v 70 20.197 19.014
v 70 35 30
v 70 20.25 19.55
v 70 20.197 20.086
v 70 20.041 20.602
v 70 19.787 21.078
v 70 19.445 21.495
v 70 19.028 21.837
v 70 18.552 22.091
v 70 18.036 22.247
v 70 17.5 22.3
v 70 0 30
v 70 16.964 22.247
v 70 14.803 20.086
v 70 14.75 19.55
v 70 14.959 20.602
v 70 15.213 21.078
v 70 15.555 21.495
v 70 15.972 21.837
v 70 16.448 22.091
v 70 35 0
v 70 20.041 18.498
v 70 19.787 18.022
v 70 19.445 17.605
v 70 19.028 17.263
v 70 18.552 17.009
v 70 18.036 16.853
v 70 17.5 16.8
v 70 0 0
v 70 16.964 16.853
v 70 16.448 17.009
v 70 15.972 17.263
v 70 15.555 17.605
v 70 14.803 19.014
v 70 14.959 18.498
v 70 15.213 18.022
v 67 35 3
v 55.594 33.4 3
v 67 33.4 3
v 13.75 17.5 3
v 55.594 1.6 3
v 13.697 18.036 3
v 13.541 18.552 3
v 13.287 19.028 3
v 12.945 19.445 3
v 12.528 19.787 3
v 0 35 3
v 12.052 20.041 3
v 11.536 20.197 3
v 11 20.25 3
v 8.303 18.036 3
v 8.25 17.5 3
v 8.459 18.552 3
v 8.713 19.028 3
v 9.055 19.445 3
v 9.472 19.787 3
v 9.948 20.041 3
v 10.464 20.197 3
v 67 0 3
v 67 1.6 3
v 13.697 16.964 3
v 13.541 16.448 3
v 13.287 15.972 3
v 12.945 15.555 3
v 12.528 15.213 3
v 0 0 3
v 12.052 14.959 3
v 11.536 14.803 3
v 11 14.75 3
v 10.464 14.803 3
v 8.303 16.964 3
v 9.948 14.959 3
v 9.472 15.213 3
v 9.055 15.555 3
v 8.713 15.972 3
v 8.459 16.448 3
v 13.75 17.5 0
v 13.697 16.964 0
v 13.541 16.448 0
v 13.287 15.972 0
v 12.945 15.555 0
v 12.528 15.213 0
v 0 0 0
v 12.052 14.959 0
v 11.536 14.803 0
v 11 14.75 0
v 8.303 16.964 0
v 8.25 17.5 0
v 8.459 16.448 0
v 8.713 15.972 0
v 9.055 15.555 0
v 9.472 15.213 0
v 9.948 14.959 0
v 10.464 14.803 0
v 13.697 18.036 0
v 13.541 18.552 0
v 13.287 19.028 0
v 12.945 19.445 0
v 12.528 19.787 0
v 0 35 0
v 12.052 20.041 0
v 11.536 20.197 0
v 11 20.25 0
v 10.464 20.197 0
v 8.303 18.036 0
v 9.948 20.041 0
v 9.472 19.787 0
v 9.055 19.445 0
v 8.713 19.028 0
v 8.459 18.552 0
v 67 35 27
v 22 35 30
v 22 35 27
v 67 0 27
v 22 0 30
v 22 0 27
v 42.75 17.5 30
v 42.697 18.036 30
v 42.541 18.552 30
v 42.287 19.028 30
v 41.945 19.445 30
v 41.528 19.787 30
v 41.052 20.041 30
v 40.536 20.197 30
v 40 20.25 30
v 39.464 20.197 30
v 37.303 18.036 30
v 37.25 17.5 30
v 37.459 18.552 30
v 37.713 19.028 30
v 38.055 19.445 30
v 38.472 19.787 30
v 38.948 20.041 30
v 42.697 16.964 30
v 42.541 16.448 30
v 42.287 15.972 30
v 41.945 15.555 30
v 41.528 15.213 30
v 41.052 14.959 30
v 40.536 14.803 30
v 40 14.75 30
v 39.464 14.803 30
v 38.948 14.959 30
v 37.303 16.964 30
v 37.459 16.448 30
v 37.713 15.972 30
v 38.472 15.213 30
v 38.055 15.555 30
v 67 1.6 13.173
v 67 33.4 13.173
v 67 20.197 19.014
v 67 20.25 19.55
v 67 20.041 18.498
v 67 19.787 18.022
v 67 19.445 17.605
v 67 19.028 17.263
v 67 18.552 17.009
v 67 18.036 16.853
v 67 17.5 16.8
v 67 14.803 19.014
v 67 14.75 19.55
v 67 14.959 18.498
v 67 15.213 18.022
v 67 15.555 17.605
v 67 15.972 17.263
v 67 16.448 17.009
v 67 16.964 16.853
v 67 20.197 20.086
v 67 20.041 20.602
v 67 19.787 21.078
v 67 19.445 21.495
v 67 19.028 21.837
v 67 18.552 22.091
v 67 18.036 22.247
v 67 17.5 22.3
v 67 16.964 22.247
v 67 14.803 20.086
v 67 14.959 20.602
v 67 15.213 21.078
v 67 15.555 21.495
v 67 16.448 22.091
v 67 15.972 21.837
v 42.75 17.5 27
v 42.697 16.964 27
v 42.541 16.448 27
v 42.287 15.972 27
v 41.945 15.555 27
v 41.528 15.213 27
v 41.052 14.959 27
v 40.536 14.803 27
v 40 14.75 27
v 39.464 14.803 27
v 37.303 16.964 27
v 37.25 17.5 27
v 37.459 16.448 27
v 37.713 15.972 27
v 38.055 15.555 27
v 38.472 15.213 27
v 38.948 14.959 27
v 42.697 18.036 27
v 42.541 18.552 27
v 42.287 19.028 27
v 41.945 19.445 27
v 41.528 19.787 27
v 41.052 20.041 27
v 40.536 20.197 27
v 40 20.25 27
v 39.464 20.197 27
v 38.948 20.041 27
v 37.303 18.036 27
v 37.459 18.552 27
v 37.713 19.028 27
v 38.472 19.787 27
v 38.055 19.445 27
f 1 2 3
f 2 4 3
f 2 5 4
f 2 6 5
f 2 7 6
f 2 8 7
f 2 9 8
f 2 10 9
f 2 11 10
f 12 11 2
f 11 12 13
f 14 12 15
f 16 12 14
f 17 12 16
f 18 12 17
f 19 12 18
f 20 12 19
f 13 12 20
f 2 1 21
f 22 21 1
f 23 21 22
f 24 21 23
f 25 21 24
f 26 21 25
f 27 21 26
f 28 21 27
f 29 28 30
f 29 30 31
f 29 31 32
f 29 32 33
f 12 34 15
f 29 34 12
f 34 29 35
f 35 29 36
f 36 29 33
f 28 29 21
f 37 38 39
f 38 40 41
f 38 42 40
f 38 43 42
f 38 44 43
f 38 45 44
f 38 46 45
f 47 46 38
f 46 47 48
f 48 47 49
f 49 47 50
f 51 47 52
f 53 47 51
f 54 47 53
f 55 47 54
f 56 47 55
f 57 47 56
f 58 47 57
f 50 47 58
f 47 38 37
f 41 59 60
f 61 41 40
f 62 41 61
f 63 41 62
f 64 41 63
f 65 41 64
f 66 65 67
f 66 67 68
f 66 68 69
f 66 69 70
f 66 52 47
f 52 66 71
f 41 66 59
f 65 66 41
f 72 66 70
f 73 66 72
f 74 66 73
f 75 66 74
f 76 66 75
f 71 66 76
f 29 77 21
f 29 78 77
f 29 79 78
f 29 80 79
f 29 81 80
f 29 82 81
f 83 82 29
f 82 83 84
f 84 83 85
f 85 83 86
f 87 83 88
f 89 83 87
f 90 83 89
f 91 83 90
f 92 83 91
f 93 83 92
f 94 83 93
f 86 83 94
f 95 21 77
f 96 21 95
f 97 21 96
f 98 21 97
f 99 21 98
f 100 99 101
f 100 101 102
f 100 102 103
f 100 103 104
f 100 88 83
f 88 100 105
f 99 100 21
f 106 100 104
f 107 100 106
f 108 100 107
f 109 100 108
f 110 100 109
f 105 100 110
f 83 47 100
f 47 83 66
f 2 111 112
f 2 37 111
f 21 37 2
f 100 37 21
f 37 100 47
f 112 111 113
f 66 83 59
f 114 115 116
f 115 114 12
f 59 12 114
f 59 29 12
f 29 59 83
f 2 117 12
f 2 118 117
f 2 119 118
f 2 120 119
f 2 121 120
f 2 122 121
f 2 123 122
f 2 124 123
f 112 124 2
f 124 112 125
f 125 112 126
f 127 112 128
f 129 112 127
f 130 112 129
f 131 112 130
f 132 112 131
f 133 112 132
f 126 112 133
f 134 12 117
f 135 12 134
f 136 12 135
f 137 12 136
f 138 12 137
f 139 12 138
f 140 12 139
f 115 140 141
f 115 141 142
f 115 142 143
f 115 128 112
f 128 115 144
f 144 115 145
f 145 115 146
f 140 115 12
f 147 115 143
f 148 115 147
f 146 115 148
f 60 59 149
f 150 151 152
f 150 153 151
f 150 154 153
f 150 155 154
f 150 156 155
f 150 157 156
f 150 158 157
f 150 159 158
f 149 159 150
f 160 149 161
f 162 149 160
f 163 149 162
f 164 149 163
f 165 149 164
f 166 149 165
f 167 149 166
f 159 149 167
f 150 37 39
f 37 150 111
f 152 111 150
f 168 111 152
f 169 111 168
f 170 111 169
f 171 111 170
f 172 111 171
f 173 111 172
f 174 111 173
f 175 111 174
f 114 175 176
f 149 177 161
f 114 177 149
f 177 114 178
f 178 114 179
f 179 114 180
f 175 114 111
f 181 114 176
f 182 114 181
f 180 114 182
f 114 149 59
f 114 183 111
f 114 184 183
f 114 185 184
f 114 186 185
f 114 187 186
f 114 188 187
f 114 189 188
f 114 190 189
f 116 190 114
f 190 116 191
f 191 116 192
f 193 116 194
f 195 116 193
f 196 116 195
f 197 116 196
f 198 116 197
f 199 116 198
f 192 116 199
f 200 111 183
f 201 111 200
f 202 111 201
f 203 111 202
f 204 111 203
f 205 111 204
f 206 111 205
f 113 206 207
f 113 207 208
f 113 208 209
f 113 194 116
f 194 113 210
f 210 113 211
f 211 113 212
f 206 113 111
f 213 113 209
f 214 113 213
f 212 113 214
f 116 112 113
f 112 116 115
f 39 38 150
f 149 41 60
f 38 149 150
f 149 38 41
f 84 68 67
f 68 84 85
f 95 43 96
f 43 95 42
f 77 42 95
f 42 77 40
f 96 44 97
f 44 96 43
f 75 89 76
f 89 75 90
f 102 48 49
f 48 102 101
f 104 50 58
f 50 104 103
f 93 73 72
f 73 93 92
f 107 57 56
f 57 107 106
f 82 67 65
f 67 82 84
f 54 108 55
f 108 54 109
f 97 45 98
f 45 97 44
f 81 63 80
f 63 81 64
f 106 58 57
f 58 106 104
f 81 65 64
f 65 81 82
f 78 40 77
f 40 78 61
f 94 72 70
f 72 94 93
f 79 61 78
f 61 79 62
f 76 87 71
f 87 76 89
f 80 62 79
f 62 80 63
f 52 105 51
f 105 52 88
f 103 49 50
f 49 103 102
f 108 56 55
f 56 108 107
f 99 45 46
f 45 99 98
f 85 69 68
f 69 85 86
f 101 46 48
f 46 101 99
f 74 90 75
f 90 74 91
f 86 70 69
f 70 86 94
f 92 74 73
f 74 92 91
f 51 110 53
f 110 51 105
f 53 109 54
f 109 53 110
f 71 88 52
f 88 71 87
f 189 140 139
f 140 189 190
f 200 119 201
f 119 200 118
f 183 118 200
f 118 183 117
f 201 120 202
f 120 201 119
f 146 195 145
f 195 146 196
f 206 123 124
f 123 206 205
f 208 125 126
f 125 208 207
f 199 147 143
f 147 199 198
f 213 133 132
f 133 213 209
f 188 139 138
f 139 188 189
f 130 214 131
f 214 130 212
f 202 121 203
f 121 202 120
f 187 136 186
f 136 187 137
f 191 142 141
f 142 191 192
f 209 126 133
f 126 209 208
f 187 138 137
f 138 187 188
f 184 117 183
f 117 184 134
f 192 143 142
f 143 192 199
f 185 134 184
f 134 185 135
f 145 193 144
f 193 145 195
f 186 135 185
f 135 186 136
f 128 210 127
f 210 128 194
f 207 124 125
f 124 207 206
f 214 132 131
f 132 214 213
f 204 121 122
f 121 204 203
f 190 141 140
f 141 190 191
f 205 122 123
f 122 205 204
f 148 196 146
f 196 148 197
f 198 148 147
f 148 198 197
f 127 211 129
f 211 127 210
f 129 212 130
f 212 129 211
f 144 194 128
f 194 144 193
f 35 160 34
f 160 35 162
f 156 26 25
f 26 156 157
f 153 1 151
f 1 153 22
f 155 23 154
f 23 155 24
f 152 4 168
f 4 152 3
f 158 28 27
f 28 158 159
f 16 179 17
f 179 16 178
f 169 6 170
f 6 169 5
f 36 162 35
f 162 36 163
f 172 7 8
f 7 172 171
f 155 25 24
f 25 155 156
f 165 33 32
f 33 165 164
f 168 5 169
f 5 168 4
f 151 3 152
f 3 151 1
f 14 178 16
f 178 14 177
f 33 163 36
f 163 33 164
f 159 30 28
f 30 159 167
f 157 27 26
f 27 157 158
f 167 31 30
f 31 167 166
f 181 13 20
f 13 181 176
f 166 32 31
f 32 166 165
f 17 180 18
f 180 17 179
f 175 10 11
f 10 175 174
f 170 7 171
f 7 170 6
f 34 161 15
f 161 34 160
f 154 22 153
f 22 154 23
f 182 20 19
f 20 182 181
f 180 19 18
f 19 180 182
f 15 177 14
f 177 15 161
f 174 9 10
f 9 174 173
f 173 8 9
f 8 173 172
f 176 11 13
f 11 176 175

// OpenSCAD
$fn = 32;

// ----------------------------------------------------------------------
// Z-bracket: 70 x 35 x 30 mm
// ----------------------------------------------------------------------

// --- parameters (mm) ---
bottom_run = 70;          // lower foot length, X
top_run = 45;             // upper foot length, X
profile_w = 35;           // bracket width, Y
height = 30;              // overall rise, Z
mat_t = 3;                // plate thickness
hole_d = 5.5;             // clearance for M5
rib_len = 13.2;           // gusset leg
rib_sink = 1.6;           // gusset overlap into the plates

module hole_z(px, py, z0) {
  translate([px, py, z0 - 2.5]) cylinder(h = mat_t + 5, d = hole_d);
}
module hole_x(py, pz) {
  translate([-2.5, py, pz]) rotate([0, 90, 0]) cylinder(h = mat_t + 5, d = hole_d);
}
module gusset(x0) {
  translate([x0, profile_w - rib_sink, 0])
    rotate([90, 0, 0])
      linear_extrude(height = profile_w - 2 * rib_sink)
        polygon(points = [[rib_sink, mat_t - rib_sink],
                          [rib_sink, mat_t - rib_sink + rib_len],
                          [-rib_len, mat_t - rib_sink]]);
}

difference() {
  union() {
    cube([bottom_run, profile_w, mat_t]);
    /* web, overlapping the lower foot */
    translate([bottom_run - mat_t, 0, 0]) cube([mat_t, profile_w, height]);
    /* upper foot, sunk into the web */
    translate([bottom_run - mat_t - top_run, 0, height - mat_t]) cube([top_run + mat_t, profile_w, mat_t]);
    gusset(bottom_run - mat_t);
  }
  hole_z(11, 17.5, 0);
  translate([bottom_run - mat_t - 27, 0, 0]) hole_z(0, 17.5, height - mat_t);
  translate([bottom_run - mat_t, 0, 0]) hole_x(17.5, 19.55);
}
